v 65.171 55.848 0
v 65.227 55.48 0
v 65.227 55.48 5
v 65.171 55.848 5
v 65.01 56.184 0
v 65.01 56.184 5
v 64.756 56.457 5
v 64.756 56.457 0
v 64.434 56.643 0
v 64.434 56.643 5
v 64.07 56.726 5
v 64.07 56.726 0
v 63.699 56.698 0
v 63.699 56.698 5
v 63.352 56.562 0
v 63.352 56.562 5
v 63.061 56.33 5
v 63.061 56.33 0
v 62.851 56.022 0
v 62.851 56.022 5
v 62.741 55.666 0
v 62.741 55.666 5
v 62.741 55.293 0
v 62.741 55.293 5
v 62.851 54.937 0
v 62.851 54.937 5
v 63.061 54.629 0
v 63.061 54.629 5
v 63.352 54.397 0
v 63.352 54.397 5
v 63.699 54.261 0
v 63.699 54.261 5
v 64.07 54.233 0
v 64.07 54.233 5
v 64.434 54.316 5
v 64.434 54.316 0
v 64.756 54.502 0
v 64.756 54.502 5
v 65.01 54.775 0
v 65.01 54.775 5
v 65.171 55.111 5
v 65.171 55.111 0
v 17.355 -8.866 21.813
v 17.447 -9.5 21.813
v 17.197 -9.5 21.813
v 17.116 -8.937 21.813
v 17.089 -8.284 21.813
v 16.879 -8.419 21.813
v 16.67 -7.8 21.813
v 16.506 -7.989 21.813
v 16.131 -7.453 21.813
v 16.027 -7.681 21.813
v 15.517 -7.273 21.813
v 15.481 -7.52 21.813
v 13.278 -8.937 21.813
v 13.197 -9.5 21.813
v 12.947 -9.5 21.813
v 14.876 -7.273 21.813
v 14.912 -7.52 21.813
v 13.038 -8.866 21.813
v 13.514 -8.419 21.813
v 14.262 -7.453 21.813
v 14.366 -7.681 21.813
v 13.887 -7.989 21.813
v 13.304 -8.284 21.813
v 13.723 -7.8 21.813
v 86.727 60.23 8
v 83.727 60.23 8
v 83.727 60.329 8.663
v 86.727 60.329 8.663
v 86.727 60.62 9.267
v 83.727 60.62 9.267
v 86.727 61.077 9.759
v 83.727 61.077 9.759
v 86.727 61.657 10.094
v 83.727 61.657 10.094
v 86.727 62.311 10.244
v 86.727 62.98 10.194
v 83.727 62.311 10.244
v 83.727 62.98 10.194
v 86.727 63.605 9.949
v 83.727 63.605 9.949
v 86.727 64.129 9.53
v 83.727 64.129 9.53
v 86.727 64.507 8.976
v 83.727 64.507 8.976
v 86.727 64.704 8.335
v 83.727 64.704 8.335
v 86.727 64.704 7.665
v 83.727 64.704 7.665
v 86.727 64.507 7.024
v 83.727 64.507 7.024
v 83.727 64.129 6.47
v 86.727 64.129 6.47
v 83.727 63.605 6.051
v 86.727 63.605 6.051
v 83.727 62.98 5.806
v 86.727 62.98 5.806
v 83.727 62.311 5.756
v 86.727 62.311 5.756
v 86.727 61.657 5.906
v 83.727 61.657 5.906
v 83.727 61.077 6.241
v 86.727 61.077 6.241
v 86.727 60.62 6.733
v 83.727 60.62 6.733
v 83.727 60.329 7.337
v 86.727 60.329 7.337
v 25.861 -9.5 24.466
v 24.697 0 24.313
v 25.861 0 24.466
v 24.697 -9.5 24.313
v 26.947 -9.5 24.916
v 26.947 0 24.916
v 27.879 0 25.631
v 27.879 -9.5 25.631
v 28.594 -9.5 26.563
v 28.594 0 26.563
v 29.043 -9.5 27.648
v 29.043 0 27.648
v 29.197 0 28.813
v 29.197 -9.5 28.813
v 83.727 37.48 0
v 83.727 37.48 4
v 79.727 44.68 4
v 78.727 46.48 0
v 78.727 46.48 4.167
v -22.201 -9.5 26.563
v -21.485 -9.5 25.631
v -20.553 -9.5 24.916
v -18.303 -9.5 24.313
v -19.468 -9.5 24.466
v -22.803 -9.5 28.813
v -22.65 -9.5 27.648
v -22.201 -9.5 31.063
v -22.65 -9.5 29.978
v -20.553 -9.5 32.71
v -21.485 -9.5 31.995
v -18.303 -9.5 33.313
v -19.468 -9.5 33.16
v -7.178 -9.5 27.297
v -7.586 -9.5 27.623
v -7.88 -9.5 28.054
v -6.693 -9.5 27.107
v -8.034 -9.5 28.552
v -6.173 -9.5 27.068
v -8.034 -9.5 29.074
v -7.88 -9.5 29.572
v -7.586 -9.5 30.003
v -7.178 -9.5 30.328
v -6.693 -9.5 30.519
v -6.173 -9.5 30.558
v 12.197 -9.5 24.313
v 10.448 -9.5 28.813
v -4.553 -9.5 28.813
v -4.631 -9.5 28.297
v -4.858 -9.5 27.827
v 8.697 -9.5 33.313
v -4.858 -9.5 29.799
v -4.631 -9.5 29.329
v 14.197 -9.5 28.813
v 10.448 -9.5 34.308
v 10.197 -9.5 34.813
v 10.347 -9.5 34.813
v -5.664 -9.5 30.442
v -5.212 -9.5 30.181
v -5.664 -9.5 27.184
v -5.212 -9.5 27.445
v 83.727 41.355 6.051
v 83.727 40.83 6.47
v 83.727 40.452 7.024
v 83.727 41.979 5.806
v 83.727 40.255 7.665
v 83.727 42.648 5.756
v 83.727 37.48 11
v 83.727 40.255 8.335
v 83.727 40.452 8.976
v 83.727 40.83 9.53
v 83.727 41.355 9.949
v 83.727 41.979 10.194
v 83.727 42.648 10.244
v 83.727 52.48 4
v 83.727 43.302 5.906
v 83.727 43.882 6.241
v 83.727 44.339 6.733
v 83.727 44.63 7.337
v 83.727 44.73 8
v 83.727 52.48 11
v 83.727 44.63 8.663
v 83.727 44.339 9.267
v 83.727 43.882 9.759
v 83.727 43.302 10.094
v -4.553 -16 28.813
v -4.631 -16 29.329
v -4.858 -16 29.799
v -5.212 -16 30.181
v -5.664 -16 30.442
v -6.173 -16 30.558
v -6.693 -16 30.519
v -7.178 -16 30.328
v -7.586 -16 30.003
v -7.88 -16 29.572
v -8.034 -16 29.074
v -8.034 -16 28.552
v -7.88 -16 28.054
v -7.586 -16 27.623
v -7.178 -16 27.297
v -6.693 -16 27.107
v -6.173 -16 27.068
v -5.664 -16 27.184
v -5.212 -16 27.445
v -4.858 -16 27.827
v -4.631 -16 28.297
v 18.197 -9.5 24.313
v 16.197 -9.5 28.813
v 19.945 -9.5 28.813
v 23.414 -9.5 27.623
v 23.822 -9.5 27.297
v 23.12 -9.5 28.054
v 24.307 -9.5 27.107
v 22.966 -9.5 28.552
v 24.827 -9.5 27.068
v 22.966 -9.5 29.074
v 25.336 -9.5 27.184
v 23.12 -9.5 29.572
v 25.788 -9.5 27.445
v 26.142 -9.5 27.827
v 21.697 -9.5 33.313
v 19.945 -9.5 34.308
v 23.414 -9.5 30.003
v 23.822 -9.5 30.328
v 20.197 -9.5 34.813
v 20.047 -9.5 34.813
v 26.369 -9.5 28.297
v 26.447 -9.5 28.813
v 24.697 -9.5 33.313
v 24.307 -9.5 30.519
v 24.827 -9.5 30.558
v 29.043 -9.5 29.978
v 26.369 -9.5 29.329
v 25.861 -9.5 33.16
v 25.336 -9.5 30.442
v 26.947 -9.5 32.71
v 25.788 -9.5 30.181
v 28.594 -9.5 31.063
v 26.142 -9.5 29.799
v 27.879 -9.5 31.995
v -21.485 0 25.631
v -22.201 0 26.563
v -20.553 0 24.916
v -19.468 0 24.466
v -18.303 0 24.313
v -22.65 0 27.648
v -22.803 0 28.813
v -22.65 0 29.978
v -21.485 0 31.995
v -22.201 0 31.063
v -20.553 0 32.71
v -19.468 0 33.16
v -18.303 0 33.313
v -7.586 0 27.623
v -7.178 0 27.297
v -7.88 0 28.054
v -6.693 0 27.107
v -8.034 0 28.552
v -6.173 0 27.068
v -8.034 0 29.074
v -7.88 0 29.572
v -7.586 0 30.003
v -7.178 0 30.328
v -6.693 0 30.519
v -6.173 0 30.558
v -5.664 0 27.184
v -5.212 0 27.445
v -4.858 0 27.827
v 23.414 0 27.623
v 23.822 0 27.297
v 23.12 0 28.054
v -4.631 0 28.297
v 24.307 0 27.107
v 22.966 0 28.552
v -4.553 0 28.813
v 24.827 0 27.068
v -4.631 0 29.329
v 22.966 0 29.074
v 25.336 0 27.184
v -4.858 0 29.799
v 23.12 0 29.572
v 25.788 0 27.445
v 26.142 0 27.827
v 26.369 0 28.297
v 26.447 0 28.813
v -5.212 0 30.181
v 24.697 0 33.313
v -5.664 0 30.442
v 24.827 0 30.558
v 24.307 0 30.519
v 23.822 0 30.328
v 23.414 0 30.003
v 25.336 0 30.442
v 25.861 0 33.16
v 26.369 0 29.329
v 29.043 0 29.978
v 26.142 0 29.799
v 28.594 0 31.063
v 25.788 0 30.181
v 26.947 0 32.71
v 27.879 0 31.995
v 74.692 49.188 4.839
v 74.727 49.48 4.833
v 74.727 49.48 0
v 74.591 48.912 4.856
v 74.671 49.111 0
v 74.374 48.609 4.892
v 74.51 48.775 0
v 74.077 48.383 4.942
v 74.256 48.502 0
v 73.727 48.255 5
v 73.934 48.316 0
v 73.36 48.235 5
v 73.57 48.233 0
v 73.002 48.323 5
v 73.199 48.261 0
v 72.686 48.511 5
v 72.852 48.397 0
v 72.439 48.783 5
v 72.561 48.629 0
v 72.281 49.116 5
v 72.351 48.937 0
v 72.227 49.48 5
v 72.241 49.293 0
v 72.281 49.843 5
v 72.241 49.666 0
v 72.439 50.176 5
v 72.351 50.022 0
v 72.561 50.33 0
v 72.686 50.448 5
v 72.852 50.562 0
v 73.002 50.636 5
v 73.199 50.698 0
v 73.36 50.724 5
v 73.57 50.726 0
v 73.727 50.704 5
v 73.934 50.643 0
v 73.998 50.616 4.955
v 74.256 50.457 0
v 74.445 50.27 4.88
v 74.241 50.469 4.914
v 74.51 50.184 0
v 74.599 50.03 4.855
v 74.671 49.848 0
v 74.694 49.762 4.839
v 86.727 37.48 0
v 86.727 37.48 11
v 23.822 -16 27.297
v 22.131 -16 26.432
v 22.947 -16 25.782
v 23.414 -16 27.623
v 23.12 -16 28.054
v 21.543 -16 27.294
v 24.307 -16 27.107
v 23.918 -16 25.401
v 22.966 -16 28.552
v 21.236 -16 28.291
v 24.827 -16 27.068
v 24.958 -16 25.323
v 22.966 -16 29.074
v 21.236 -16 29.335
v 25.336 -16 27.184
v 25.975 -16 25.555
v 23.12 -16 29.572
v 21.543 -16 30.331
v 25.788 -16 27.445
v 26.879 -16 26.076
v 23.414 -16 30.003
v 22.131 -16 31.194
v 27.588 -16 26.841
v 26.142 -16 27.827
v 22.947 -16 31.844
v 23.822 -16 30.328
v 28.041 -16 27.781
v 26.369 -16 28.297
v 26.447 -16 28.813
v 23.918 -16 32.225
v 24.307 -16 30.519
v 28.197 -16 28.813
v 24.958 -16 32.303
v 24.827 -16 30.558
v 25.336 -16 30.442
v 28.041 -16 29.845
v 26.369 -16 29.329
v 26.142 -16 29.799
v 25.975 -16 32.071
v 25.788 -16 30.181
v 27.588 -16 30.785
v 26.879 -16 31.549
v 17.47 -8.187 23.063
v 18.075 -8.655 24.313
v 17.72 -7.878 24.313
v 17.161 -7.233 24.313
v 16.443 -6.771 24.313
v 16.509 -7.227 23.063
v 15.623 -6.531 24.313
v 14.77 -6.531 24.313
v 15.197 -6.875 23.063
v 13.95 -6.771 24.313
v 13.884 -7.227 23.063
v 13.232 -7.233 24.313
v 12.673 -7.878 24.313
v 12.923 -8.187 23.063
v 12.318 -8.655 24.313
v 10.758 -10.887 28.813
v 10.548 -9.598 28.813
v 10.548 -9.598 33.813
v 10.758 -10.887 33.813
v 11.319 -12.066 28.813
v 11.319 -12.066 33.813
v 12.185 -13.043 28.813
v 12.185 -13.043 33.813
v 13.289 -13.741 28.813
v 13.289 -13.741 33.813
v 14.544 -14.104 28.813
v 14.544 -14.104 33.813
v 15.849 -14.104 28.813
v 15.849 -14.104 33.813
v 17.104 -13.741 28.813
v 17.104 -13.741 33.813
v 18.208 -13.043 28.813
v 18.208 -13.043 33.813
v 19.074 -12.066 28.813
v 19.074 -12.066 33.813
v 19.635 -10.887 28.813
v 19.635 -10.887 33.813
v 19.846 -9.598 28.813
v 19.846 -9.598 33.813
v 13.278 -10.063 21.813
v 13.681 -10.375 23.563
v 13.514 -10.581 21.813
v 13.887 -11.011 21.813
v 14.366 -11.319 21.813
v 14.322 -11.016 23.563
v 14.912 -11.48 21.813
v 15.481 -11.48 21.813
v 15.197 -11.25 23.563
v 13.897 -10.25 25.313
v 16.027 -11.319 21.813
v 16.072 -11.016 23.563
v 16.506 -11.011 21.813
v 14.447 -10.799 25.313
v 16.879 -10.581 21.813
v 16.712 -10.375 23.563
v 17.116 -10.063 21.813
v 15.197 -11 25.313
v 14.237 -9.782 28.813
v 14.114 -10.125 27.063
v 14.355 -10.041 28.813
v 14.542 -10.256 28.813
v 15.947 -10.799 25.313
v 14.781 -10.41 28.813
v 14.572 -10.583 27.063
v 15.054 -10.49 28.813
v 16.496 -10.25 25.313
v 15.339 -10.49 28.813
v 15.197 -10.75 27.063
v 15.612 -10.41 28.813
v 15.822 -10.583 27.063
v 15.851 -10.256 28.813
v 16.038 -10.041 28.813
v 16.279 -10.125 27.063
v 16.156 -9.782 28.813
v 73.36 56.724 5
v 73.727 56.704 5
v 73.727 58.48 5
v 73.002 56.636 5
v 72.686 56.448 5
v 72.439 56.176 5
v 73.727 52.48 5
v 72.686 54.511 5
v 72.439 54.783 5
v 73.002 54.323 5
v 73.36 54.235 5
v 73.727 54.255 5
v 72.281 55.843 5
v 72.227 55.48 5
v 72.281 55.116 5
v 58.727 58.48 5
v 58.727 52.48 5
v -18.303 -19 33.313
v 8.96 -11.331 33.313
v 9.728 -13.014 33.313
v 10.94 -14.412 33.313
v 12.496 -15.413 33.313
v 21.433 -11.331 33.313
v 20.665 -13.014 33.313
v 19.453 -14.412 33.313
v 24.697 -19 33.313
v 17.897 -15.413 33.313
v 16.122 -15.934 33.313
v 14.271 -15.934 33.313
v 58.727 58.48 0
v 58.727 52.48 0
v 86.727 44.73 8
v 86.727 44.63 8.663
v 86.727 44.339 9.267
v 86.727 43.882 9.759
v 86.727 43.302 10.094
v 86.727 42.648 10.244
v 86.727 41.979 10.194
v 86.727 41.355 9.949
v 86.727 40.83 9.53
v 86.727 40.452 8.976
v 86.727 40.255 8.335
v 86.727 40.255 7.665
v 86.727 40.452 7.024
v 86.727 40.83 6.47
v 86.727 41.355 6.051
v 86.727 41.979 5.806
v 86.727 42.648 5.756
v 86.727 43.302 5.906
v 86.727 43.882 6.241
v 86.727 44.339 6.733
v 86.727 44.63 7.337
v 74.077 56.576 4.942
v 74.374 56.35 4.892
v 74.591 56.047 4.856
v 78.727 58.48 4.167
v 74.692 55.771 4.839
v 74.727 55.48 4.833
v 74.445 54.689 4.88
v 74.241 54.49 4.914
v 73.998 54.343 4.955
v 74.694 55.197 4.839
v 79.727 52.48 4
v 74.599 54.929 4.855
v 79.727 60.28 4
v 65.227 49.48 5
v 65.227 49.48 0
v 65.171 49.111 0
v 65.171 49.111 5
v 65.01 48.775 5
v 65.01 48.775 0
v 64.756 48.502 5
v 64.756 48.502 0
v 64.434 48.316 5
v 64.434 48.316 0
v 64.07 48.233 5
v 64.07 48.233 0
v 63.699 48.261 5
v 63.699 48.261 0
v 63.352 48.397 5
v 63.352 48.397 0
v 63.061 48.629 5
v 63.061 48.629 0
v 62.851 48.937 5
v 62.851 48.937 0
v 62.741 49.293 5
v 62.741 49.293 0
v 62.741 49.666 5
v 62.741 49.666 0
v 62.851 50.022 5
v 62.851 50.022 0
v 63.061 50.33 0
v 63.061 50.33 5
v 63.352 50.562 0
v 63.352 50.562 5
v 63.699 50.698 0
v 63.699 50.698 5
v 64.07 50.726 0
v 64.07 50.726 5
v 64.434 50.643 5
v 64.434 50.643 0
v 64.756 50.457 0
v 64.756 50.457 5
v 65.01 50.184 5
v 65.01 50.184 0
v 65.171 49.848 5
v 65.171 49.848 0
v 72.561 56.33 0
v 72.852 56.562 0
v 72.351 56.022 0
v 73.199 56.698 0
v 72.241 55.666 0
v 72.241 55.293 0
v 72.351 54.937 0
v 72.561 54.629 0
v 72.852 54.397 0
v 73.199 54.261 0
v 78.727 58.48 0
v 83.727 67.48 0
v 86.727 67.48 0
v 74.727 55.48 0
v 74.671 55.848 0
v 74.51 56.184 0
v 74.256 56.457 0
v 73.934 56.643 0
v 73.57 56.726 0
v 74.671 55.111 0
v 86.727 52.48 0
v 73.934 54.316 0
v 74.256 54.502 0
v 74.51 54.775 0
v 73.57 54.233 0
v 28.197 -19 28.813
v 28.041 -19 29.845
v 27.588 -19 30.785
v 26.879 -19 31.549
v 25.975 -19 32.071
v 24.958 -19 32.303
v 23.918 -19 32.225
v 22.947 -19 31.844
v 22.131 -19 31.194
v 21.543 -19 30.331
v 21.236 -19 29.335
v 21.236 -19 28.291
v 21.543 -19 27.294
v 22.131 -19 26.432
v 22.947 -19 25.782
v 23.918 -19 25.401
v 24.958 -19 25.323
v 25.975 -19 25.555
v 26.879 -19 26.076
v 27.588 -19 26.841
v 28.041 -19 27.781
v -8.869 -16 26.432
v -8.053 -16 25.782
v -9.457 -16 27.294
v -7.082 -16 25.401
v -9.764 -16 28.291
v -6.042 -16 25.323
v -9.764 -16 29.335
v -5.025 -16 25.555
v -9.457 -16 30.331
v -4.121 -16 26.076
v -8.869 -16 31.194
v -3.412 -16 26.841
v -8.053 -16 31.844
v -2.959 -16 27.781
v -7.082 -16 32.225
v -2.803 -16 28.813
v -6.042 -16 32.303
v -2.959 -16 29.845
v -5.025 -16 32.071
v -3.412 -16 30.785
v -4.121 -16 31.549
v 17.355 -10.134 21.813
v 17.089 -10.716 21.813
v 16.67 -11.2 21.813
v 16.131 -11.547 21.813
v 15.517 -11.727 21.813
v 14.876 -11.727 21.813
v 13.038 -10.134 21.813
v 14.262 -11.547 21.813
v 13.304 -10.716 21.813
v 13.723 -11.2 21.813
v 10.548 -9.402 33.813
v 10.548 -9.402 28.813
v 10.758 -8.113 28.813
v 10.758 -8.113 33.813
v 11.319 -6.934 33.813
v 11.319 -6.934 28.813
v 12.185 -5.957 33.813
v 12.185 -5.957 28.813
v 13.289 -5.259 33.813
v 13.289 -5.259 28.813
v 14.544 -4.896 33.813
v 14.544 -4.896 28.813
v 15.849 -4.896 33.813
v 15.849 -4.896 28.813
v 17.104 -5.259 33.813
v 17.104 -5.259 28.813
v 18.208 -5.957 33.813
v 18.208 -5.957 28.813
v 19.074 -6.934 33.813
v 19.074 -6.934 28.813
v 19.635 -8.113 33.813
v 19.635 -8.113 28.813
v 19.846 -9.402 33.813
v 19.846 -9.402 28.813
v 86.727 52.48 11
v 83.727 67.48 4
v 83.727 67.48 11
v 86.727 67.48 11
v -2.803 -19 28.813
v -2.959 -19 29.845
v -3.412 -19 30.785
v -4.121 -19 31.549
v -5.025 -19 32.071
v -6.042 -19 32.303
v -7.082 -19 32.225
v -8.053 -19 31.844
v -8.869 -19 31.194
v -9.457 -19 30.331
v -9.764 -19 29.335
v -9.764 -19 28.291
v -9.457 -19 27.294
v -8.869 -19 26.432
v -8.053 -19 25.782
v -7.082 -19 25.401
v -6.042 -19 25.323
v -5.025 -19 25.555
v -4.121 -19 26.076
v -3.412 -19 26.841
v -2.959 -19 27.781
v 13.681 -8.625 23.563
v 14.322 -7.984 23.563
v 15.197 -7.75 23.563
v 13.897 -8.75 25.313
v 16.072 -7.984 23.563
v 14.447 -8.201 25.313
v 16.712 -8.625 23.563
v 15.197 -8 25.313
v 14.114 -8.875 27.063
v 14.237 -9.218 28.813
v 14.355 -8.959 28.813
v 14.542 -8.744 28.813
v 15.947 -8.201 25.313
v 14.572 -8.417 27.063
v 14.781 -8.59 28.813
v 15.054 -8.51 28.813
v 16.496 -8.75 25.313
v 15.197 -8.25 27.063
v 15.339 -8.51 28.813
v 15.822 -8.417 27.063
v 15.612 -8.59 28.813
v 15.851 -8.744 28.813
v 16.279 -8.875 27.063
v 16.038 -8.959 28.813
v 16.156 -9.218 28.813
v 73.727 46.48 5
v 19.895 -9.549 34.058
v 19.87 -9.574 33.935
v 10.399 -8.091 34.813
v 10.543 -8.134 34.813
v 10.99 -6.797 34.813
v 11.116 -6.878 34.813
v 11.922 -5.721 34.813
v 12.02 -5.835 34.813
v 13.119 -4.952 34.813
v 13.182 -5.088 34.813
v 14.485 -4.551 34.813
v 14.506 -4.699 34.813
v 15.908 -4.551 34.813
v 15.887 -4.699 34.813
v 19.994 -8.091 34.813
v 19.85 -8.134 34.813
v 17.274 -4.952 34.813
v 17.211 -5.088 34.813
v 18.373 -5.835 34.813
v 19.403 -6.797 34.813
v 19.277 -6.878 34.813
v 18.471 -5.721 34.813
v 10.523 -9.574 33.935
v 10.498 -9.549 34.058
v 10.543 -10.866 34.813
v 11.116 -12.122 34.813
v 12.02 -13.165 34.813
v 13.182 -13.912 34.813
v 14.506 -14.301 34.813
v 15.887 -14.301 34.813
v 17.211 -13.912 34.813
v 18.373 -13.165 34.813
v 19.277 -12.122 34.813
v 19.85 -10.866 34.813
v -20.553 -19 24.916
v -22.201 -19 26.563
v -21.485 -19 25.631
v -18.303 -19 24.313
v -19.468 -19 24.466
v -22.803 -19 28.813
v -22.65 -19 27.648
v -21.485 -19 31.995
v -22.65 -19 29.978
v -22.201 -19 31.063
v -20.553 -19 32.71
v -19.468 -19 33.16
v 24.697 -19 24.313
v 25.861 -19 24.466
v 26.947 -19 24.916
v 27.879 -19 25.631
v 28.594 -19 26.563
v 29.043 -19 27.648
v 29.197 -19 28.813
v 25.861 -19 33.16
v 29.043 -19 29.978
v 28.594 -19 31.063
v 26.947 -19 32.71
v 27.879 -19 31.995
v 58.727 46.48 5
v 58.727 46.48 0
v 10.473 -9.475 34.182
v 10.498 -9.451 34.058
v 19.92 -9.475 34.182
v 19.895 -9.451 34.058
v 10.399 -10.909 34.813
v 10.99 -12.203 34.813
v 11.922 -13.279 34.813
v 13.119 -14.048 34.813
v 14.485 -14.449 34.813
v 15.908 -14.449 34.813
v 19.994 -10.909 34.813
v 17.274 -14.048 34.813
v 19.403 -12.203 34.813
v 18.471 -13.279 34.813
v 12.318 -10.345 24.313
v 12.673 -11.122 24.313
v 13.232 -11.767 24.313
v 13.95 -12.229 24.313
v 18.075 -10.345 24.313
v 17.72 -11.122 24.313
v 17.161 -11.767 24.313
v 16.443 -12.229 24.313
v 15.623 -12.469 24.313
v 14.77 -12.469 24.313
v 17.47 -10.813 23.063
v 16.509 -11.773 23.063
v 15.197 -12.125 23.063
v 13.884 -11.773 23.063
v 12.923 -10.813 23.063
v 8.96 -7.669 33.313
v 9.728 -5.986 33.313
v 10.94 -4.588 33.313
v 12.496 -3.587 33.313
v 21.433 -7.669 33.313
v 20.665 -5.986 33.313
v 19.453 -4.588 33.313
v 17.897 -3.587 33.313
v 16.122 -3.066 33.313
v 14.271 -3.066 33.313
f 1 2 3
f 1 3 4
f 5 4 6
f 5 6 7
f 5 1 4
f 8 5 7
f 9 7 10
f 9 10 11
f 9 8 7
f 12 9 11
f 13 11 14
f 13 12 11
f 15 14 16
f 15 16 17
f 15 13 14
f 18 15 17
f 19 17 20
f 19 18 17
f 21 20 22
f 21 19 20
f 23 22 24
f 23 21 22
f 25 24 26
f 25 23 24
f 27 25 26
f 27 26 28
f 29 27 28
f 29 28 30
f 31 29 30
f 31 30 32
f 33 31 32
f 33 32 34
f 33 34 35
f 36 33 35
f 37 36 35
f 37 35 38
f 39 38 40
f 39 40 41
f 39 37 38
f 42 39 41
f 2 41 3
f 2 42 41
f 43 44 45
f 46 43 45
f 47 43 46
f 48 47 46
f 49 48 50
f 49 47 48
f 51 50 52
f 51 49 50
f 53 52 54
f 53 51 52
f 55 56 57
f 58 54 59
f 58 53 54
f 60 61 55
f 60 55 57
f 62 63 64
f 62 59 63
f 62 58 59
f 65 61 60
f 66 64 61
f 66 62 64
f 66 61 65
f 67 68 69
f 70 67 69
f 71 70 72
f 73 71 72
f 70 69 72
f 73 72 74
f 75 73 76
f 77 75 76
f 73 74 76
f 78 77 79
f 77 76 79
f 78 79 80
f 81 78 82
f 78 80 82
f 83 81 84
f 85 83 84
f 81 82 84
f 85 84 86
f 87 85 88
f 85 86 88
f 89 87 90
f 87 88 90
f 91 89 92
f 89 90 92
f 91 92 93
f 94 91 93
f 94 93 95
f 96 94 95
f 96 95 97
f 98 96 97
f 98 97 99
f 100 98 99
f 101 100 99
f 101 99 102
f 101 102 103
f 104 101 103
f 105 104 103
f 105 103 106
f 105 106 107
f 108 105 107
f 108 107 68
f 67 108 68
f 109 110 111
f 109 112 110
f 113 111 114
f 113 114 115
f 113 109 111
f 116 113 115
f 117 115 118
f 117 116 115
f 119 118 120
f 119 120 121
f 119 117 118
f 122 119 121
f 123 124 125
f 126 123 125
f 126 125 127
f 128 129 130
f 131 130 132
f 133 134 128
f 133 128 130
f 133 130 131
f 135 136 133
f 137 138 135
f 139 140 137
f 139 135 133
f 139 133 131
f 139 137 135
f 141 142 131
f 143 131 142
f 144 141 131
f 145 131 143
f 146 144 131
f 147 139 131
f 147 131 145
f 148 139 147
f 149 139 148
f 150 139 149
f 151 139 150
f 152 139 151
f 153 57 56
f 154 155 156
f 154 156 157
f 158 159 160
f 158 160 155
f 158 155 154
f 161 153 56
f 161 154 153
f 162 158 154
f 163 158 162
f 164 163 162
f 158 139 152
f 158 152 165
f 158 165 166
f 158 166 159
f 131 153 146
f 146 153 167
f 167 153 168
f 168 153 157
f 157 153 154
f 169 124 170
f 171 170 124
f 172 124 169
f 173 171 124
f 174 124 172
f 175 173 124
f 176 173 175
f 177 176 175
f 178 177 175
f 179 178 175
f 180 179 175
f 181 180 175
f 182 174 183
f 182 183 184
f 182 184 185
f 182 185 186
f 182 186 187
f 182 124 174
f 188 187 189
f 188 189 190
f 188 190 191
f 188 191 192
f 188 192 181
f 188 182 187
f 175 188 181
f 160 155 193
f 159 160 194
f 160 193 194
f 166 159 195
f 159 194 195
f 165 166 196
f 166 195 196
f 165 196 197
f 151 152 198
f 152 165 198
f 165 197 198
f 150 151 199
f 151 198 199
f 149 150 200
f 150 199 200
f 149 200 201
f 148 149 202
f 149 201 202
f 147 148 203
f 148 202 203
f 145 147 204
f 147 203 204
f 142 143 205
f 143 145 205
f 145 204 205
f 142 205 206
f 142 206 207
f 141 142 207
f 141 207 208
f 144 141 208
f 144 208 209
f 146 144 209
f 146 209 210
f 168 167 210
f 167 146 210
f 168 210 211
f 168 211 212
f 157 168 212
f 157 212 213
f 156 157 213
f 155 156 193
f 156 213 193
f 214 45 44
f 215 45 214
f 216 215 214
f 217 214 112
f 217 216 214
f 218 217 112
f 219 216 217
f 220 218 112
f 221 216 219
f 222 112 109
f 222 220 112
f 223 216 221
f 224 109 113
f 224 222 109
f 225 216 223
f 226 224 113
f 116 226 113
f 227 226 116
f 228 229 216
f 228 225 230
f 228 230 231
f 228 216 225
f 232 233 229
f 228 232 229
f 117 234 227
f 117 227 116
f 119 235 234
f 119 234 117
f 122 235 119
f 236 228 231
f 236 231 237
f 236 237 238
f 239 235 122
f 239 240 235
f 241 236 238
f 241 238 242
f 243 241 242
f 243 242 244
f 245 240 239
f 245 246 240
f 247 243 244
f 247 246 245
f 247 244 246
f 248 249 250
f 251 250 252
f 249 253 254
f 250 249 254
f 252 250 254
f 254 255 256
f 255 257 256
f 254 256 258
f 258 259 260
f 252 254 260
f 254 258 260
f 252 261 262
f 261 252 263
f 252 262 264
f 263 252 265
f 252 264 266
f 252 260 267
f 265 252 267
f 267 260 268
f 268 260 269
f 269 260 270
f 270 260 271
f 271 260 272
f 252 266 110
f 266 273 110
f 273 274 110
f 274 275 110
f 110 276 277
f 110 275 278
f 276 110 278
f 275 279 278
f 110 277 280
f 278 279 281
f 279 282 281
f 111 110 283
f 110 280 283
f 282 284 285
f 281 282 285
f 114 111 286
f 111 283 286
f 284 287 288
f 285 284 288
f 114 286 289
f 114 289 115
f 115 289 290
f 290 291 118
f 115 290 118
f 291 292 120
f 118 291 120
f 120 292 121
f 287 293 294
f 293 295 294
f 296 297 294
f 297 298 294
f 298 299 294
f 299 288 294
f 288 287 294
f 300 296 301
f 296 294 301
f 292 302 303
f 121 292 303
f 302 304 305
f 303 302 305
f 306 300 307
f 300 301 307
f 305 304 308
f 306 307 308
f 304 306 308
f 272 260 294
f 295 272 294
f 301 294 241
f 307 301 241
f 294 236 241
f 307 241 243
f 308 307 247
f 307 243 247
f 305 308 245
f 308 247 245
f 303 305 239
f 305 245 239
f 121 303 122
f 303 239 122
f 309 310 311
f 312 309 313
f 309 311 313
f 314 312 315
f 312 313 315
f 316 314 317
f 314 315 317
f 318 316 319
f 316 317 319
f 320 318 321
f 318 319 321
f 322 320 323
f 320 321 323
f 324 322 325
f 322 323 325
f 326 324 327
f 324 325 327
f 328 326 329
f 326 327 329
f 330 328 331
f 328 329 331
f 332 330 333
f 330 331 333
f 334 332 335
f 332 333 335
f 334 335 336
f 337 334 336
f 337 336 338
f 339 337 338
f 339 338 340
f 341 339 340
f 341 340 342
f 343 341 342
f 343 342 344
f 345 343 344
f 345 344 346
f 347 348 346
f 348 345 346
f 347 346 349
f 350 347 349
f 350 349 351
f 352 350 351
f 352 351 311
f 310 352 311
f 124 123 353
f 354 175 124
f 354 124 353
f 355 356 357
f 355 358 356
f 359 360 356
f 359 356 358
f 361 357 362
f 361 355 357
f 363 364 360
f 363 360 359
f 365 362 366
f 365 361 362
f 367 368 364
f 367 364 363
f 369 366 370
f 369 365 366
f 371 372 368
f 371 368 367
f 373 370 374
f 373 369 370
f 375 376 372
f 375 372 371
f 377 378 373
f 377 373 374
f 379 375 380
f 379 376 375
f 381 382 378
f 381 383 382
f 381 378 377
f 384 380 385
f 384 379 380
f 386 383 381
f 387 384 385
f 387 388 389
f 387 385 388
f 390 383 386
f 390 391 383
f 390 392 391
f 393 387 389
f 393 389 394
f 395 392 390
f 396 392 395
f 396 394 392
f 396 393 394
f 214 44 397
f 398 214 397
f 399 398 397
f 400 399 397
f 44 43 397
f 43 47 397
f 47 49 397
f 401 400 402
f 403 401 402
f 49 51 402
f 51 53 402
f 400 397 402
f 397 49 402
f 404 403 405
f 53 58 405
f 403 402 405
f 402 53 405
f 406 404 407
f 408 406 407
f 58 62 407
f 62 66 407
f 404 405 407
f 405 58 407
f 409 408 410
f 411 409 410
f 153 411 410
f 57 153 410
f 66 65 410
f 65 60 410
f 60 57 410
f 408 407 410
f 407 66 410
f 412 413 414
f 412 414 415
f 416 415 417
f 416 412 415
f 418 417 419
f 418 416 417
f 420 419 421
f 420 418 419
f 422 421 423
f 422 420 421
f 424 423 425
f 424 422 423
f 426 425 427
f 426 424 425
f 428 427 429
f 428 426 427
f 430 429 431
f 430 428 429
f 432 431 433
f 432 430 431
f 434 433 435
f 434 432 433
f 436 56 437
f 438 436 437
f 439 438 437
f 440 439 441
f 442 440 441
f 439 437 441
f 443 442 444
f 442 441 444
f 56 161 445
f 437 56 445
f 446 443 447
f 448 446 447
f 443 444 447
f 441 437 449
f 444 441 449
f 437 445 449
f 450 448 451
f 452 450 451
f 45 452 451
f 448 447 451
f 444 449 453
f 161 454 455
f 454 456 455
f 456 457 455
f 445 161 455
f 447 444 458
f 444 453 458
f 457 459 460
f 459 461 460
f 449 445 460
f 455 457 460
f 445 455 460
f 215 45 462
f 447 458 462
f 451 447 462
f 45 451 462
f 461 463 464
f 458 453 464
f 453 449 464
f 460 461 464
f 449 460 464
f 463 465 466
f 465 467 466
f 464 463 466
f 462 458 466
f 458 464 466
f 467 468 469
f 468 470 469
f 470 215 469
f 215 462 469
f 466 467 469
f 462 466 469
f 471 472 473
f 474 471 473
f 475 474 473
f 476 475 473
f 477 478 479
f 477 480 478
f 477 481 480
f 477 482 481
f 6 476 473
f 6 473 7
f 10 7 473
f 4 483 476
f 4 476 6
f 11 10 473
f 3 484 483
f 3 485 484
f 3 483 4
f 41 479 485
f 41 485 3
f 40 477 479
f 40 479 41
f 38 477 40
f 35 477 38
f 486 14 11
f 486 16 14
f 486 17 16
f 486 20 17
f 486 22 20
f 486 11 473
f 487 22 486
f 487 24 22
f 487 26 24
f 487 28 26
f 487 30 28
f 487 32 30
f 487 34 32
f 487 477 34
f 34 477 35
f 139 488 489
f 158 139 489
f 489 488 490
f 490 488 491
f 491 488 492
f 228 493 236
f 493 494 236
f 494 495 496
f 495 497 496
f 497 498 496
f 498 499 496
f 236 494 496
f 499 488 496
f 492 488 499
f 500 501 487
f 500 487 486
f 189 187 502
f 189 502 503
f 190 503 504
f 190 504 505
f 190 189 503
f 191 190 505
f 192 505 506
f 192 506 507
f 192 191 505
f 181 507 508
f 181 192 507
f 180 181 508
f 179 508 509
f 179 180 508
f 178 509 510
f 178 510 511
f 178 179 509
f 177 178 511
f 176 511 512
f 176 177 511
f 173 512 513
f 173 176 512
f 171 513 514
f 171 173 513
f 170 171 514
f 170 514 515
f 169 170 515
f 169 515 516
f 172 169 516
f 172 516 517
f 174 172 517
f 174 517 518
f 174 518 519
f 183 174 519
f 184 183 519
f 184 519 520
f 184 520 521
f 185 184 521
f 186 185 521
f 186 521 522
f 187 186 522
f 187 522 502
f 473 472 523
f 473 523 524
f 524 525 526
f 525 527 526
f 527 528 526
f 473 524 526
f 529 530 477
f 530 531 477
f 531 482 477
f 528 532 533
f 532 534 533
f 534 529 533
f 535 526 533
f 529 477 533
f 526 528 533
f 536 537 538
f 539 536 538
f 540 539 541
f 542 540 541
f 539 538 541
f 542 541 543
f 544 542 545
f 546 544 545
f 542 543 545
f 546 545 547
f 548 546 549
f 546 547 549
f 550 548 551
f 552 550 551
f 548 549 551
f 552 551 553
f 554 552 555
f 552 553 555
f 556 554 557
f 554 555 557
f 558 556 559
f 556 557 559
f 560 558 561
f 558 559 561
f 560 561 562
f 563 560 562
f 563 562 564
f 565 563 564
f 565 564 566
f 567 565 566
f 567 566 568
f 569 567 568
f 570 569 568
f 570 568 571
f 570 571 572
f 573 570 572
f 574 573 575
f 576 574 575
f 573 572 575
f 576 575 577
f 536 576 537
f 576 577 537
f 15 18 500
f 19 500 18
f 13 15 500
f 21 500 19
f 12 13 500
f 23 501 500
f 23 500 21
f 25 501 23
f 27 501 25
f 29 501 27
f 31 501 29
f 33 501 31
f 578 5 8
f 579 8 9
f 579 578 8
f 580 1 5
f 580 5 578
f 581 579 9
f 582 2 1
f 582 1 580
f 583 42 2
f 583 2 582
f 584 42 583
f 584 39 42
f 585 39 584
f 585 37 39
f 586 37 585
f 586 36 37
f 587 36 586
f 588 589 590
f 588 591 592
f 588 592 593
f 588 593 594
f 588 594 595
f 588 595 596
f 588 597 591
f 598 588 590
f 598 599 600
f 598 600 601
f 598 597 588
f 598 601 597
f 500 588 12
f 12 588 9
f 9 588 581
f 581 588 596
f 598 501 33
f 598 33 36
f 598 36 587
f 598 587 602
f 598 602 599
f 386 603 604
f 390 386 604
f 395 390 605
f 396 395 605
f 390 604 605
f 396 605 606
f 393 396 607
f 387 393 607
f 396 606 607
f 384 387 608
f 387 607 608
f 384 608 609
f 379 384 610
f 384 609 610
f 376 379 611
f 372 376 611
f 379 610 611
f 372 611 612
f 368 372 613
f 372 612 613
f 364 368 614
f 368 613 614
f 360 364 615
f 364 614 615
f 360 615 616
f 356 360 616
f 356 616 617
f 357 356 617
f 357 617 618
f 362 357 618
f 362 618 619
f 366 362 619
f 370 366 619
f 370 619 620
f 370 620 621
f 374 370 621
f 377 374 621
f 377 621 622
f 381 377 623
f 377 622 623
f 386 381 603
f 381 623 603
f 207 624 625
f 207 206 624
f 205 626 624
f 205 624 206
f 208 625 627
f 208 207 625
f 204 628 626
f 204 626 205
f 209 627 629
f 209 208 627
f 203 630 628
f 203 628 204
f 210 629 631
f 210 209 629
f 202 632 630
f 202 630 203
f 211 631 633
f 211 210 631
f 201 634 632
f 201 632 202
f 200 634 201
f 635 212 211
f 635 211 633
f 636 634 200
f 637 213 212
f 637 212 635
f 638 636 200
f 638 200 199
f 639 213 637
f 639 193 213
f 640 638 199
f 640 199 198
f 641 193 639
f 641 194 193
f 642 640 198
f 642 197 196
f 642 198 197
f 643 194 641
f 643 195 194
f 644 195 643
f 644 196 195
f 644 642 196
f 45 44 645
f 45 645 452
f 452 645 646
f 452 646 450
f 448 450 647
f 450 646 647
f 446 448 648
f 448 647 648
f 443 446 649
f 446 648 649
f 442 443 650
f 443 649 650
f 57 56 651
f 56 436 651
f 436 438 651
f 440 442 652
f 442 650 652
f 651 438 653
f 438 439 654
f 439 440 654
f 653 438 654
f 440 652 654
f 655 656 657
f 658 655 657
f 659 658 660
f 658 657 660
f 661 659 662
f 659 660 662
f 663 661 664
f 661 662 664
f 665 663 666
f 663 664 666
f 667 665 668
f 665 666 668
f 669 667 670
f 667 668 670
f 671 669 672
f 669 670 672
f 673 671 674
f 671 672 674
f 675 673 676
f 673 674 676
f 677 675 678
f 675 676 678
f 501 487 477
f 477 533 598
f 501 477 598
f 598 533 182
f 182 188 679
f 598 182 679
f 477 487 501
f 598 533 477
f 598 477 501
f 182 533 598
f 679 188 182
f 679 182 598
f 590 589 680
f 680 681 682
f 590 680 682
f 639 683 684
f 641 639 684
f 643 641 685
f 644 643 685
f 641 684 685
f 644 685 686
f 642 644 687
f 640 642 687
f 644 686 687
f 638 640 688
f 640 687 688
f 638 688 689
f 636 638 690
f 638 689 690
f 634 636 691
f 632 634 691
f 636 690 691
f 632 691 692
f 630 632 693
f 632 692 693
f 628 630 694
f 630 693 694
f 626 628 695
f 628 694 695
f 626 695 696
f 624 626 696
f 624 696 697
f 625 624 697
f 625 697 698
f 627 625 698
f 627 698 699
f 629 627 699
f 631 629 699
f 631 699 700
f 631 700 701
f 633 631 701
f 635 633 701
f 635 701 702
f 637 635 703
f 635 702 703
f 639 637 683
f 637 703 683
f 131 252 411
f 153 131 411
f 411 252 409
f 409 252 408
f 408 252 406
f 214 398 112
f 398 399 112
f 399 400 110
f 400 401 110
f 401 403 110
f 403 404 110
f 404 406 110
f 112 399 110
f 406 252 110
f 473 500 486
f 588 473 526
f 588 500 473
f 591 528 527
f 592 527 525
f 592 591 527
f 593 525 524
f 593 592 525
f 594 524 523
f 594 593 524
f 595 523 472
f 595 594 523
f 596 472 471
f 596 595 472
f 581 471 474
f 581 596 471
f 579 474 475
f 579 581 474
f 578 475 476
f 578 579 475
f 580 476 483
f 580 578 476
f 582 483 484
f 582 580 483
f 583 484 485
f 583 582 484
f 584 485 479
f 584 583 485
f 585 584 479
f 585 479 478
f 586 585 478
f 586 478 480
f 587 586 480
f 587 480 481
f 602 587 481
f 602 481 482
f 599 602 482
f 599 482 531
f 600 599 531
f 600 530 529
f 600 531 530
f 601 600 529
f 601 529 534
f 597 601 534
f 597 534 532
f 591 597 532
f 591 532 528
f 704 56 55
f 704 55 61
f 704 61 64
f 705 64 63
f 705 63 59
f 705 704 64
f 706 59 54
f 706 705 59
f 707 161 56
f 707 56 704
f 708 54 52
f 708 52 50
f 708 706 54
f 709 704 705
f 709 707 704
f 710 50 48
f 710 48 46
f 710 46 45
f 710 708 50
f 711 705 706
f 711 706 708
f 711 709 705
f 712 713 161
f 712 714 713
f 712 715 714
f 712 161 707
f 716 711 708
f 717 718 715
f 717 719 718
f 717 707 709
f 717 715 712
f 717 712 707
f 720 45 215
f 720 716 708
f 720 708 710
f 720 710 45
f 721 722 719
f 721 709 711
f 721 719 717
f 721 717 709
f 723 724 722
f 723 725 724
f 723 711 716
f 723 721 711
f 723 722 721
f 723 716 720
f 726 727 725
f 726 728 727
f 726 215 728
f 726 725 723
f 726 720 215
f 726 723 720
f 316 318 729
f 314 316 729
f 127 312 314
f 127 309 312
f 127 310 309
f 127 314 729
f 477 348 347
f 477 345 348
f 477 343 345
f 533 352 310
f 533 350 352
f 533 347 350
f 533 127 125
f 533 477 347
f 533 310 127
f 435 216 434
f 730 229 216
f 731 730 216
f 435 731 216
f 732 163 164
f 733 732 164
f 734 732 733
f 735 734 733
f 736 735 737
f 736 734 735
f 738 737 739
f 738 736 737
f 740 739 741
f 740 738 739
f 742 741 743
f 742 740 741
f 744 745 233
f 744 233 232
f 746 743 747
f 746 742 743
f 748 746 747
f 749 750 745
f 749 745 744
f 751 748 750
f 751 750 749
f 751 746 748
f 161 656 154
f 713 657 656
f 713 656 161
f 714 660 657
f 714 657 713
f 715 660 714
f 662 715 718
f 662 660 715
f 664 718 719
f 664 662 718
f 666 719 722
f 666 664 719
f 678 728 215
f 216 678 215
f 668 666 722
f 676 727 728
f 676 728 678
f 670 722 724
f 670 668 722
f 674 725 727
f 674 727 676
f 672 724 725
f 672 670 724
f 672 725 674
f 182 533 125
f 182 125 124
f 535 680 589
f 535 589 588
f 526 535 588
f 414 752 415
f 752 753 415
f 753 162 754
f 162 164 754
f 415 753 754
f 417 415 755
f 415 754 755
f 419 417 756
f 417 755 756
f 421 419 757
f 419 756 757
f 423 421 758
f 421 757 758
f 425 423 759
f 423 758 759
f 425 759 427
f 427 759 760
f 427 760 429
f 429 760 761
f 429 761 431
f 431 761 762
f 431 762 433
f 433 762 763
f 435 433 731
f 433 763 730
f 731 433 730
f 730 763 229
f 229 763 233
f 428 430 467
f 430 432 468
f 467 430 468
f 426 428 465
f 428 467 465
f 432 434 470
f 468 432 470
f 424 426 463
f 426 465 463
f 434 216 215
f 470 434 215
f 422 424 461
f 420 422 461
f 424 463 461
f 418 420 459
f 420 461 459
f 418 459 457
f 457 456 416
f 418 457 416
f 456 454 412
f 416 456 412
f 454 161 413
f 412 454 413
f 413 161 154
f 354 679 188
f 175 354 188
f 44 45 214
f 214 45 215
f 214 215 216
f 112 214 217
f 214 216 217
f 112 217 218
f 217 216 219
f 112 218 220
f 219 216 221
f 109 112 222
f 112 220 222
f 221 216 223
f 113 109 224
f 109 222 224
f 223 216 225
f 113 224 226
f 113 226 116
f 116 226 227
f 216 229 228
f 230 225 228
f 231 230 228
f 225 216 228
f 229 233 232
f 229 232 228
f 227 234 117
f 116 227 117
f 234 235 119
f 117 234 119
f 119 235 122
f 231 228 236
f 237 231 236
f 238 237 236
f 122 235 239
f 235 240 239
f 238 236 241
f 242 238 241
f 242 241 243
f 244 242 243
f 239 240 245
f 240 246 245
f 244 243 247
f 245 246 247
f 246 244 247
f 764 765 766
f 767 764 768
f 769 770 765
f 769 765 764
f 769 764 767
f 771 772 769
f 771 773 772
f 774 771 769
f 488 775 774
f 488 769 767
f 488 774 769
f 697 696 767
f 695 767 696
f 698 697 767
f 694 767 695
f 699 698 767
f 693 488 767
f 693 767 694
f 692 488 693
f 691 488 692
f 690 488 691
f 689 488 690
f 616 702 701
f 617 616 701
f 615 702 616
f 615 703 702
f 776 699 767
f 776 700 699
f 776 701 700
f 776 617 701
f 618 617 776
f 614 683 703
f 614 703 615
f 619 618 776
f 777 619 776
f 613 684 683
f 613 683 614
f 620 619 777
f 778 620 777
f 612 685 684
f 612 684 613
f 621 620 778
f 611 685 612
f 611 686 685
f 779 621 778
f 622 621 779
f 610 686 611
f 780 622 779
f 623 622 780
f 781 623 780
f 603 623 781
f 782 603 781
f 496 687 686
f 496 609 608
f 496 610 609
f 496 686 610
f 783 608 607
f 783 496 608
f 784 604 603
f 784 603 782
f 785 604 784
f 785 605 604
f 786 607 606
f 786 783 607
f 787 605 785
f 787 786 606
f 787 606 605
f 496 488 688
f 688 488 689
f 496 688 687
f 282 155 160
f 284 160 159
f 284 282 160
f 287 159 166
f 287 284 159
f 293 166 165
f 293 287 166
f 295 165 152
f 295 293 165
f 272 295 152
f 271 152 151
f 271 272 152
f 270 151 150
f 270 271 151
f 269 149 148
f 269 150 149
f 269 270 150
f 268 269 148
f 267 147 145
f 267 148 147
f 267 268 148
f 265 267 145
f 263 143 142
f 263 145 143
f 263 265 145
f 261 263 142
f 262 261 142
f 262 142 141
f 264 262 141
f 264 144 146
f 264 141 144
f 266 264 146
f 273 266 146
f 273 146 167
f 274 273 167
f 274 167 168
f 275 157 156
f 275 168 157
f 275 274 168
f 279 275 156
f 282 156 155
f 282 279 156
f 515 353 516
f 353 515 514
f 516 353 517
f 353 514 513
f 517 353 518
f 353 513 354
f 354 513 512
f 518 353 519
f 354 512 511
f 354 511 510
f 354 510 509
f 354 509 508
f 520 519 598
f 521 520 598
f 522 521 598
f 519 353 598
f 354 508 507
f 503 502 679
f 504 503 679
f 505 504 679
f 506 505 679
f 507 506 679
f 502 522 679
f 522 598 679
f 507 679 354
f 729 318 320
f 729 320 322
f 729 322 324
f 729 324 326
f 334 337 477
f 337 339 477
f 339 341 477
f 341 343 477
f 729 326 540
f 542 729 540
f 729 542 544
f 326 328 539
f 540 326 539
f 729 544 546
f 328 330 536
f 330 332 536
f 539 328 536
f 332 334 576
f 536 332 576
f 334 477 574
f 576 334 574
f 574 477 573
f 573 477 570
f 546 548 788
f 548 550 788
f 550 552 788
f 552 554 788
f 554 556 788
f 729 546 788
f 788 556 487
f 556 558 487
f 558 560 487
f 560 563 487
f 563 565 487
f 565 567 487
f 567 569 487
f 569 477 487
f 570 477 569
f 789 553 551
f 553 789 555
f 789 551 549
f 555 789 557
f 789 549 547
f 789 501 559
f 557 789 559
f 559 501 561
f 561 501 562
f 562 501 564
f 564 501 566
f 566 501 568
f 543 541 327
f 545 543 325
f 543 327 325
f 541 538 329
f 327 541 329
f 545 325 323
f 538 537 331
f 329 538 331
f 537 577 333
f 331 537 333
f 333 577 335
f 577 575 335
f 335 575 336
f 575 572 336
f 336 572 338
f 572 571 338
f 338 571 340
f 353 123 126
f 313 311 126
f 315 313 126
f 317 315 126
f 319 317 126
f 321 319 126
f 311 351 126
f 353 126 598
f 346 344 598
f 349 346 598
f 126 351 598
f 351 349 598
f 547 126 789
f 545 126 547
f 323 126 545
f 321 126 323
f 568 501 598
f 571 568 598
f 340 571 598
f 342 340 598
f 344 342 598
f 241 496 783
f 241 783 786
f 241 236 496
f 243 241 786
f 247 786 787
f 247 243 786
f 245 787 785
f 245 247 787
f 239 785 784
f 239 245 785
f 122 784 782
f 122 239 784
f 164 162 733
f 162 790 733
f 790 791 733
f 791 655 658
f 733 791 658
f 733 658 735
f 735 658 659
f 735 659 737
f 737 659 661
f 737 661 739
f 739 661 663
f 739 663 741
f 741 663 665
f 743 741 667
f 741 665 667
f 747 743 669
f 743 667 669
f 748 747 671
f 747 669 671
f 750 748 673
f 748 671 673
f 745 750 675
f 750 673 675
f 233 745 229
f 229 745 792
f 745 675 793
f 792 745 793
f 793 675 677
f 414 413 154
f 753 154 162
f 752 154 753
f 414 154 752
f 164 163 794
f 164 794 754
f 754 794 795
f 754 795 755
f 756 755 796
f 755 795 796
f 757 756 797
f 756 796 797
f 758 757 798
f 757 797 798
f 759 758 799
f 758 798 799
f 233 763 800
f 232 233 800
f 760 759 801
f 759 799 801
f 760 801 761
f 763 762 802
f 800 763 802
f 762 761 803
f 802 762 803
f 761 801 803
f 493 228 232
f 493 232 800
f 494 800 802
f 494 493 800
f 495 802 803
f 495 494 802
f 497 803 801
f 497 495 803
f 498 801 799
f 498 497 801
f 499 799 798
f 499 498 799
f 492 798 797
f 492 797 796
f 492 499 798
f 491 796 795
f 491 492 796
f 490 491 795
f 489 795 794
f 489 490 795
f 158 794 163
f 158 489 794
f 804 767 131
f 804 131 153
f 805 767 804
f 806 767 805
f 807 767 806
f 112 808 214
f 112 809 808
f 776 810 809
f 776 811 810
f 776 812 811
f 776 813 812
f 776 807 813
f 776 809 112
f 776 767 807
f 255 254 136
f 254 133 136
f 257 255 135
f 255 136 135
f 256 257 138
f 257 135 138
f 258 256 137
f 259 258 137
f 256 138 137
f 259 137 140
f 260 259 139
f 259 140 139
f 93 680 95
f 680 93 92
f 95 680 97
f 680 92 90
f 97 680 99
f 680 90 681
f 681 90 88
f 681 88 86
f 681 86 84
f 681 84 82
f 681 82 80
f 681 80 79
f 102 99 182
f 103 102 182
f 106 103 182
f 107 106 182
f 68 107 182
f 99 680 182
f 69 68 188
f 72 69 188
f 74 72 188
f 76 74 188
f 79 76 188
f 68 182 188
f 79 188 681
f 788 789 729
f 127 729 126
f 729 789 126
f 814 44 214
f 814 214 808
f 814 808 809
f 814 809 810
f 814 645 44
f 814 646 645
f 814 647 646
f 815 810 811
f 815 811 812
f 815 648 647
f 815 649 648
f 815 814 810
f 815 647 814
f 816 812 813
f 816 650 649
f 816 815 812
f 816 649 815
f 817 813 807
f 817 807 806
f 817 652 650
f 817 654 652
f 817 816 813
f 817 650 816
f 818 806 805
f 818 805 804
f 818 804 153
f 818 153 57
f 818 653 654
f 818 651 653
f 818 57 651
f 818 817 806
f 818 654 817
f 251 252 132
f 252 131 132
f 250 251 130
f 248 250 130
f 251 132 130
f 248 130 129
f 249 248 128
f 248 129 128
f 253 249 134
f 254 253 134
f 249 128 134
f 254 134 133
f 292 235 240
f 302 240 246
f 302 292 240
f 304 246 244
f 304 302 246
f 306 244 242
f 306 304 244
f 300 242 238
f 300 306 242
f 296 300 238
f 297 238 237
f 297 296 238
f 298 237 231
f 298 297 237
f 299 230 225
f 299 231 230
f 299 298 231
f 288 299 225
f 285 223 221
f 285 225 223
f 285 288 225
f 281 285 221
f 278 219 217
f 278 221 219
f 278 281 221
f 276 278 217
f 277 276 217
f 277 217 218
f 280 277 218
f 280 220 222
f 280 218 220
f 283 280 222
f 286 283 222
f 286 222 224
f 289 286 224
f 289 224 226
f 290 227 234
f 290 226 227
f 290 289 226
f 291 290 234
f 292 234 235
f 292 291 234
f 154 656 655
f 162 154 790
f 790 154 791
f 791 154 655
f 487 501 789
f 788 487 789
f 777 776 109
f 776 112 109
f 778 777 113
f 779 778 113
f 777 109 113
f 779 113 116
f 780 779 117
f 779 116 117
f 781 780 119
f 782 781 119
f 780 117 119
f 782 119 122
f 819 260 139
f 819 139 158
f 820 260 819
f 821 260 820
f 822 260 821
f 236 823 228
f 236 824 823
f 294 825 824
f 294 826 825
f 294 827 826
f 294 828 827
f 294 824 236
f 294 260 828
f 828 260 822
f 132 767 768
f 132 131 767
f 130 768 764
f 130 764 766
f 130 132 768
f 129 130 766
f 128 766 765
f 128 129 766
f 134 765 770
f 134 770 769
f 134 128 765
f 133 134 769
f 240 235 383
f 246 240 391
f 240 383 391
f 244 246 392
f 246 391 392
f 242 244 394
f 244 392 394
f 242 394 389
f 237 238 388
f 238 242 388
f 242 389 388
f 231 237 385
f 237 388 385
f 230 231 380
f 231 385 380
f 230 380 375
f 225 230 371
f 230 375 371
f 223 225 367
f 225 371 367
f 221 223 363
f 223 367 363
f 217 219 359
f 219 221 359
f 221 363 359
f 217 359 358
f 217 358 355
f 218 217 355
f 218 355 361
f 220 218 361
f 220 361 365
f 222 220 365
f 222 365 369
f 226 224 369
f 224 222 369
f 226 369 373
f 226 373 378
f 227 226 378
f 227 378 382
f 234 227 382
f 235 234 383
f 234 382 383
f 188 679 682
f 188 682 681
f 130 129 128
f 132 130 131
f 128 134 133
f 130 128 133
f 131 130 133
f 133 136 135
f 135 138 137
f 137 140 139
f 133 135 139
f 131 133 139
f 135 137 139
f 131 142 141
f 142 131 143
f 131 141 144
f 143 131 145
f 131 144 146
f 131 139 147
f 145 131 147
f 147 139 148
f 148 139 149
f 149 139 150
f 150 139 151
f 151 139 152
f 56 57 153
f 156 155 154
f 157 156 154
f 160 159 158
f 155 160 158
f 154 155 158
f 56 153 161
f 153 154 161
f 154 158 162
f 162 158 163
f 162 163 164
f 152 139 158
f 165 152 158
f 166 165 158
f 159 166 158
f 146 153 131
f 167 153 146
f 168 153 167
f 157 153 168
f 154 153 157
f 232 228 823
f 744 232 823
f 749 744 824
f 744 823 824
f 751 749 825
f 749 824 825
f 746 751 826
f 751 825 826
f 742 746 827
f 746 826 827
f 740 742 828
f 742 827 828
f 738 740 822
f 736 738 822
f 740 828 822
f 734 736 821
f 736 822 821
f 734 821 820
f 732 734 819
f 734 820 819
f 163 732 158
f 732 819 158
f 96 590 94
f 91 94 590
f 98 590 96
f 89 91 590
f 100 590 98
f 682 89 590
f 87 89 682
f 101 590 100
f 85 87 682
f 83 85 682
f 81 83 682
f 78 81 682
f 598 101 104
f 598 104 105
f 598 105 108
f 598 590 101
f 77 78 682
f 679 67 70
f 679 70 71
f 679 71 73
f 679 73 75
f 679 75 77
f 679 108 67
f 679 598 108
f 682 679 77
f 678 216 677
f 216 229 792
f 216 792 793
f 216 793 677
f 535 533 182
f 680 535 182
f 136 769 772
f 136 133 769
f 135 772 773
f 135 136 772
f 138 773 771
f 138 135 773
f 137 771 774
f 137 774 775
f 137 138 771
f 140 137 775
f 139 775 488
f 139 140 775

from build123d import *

# Parameters (mm, degrees)
F0_W           = 52
F0_H           = 9
F1_DEPTH       = 9.5
F3_DEPTH       = 4.5
F4_DEPTH       = 1.5
F5_SIZE        = 1.49999
F6_W           = 3
F6_H           = 2.5
F7_ANGLE       = 180
F10_SIZE2      = 0.74999
F10_SIZE       = 2.49999
F11_R          = 1.75
F12_DEPTH      = 42.06082
F13_R          = 4.49999
F15_R          = 3.5
F15_R_2        = 1.75
F16_DEPTH      = 3
F17_W          = 20
F17_H          = 6
F17_R          = 1.25
F18_DEPTH      = 5
F20_DEPTH      = 15
F21_T4_DEPTH   = 51.5816860873
F22_R          = 2.25
F23_DEPTH      = 25
F25_DEPTH      = 25
F27_T1_DEPTH   = 6.2546093825
F27_2_T1_DEPTH = 6.2546093825
F28_SIZE2      = 0.2
F28_SIZE       = 1
F29_SIZE2      = 1
F29_SIZE       = 0.2


# Not quite as in the source:
# - a fillet or chamfer that OpenCascade refuses, or shapes differently, is made with other operations: its cross-section is extruded or revolved along the edge and cut away or added
# - a fillet or chamfer is up to 0.001 mm smaller than in the source, because OpenCascade refuses the exact size


with BuildPart() as f1:
    # F0 (on Front) → F1 (new body)
    with BuildSketch(Plane.XZ):
        with Locations((3.196533835, 28.8128983229)):
            Rectangle(F0_W, F0_H)
    extrude(amount=F1_DEPTH)

    # F2 (on face) → F3 (cut)
    with BuildSketch(Plane.XY.offset(33.3128983229)):
        with BuildLine():
            Line((10.546533835, -9.5), (19.846533835, -9.5))
            ThreePointArc((19.846533835, -9.5), (15.196533835, -4.85), (10.546533835, -9.5))
        make_face()
    extrude(amount=-F3_DEPTH, mode=Mode.SUBTRACT)

    # F2 (on face) → F4 (join)
    with BuildSketch(Plane.XY.offset(33.3128983229)):
        with BuildLine():
            ThreePointArc((10.546533835, -9.5), (15.196533835, -4.85), (19.846533835, -9.5))
            Line((19.846533835, -9.5), (21.696533835, -9.5))
            ThreePointArc((21.696533835, -9.5), (15.196533835, -3), (8.696533835, -9.5))
            Line((8.696533835, -9.5), (10.546533835, -9.5))
        make_face()
    extrude(amount=F4_DEPTH)

    # F5 (size 1.5 in the source; OpenCascade refuses exactly that, so slightly less here)
    f5_edges = [f1.edges().sort_by_distance(p)[0] for p in [
        (15.196534, -3, 34.812898),
    ]]
    chamfer(f5_edges, length=F5_SIZE)

    # F6 (on face) → F7 (revolve)
    with BuildSketch(Plane.XZ.offset(9.5)):
        with Locations((16.696533835, 23.0628983229)):
            Rectangle(F6_W, F6_H)
        Polygon((16.196533835, 28.8128983229), (15.196533835, 28.8128983229), (15.196533835, 24.3128983229), (18.196533835, 24.3128983229), align=None)
    revolve(axis=Axis((15.196533835, -9.5, 25.3128983229), (0, 0, 1)), revolution_arc=F7_ANGLE)

    # F8 (on face) → F9 (revolve, cut)
    with BuildSketch(Plane.XZ.offset(9.5)):
        Polygon((16.196533835, 28.8128983229), (15.196533835, 28.8128983229), (15.196533835, 21.8128983229), (17.196533835, 21.8128983229), align=None)
    revolve(axis=Axis((15.196533835, -9.5, 25.3128983229), (0, 0, -1)), mode=Mode.SUBTRACT)

    # F10 (size 2.5 and 0.75 in the source; OpenCascade refuses exactly that, so slightly less here)
    f10_edges = [f1.edges().sort_by_distance(p)[0] for p in [
        (15.196534, -6.5, 21.812898),
    ]]
    f10_side = f1.faces().sort_by_distance((15.196534, -6.5, 23.062898))[0]
    chamfer(f10_edges, length=F10_SIZE, length2=F10_SIZE2, reference=f10_side)

    # F11 (on Front) → F12 (cut)
    with BuildSketch(Plane.XZ):
        with Locations((24.696533835, 28.8128983229)):
            Circle(F11_R)
        with Locations((-6.303466165, 28.8128983229)):
            Circle(F11_R)
    extrude(amount=F12_DEPTH, mode=Mode.SUBTRACT)

    # F13 (radius 4.5 in the source; OpenCascade refuses exactly that, so slightly less here)
    f13_edges = [f1.edges().sort_by_distance(p)[0] for p in [
        (29.196534, -4.75, 33.312898),
        (29.196534, -4.75, 24.312898),
        (-22.803466, -4.75, 33.312898),
        (-22.803466, -4.75, 24.312898),
    ]]
    fillet(f13_edges, radius=F13_R)


with BuildPart() as f14_1:
    # F14: instance of F1
    add(f1.part.mirror(Plane(origin=(-4.5395011787, -9.5, 28.6957157719), x_dir=(1, 0, 0), z_dir=(0, -1, 0))))

    # F15 (on face) → F16 (cut)
    with BuildSketch(Plane.XZ.offset(19)):
        with Locations((-6.303466165, 28.8128983229)):
            Circle(F15_R)
        with Locations((-6.303466165, 28.8128983229)):
            Circle(F15_R_2, mode=Mode.SUBTRACT)
        with Locations((24.696533835, 28.8128983229)):
            Circle(F15_R)
        with Locations((24.696533835, 28.8128983229)):
            Circle(F15_R_2, mode=Mode.SUBTRACT)
    extrude(amount=-F16_DEPTH, mode=Mode.SUBTRACT)

    # F27: chamfer of 0.1 on 2 edges, made by hand

    # F27_s2 → F27_t1 (cut)
    with BuildSketch(Plane.XY.offset(28.8128983229)):
        with BuildLine():
            Line((10.5475644201, -9.5978947368), (10.4475865832, -9.5))
            Line((10.4475865832, -9.5), (10.546533835, -9.5))
            ThreePointArc((10.546533835, -9.5), (10.5468065962, -9.5503647222), (10.5475644201, -9.5978947368))
        make_face()
        with BuildLine():
            Line((19.9454810868, -9.5), (19.8455032499, -9.5978947368))
            ThreePointArc((19.8455032499, -9.5978947368), (19.8462610737, -9.5503647222), (19.846533835, -9.5))
            Line((19.846533835, -9.5), (19.9454810868, -9.5))
        make_face()
    extrude(amount=F27_T1_DEPTH, mode=Mode.SUBTRACT)

    # F28
    f28_edges = [f14_1.edges().sort_by_distance(p)[0] for p in [
        (15.196534, -14.15, 34.812898),
    ]]
    f28_side = f14_1.faces().sort_by_distance((15.196534, -14.15, 31.812898))[0]
    chamfer(f28_edges, length=F28_SIZE, length2=F28_SIZE2, reference=f28_side)


with BuildPart() as f18:
    # F17 (on Top) → F18 (new body)
    with BuildSketch(Plane.XY):
        with Locations((68.7268972397, 55.4795021277)):
            Rectangle(F17_W, F17_H)
        with Locations((63.9768972397, 55.4795021277)):
            Circle(F17_R, mode=Mode.SUBTRACT)
        with Locations((73.4768972397, 55.4795021277)):
            Circle(F17_R, mode=Mode.SUBTRACT)
    extrude(amount=F18_DEPTH)

    # F19 (on face) → F20 (join)
    with BuildSketch(Plane.XZ.offset(-52.4795021277)):
        Polygon((83.7268972397, 5), (78.7268972397, 5), (78.7268972397, 0), (86.7268972397, 0), (86.7268972397, 11), (83.7268972397, 11), align=None)
    extrude(amount=-F20_DEPTH)

    # F21: chamfer of 9 x 5 on 1 edges, made by hand


with BuildPart() as f21_tool2:
    # F21_s3 → F21_t4 (new body)
    with BuildSketch(Plane.XY.offset(28.2908430436)):
        Polygon((83.7268972397, 67.4795021277), (78.7268972397, 58.4795021277), (78.7268972397, 67.4795021277), align=None)
    extrude(amount=-F21_T4_DEPTH)

    split(bisect_by=Plane.XZ.offset(-58.4795021277), keep=Keep.BOTTOM)


with BuildPart() as f18_1:
    add(f18.part)

    # F21_t1: cut F21_tool2
    add(f21_tool2.part, mode=Mode.SUBTRACT)

    # F22 (on face) → F23 (cut)
    with BuildSketch(Plane(origin=(83.7268972397, 0, 0), x_dir=(0, -1, 0), z_dir=(-1, 0, 0))):
        with Locations((-62.4795021277, 8)):
            Circle(F22_R)
    extrude(amount=-F23_DEPTH, mode=Mode.SUBTRACT)

    # F24 (on face) → F25 (cut)
    with BuildSketch(Plane.XZ.offset(-52.4795021277)):
        Polygon((83.7268972397, 4), (83.7268972397, 5), (73.7268972397, 5), (79.7268972397, 4), align=None)
    extrude(amount=-F25_DEPTH, mode=Mode.SUBTRACT)


with BuildPart() as f26_1:
    # F26: instance of F18
    add(f18_1.part.mirror(Plane(origin=(73.8792151205, 52.4795021277, 3.059602649), x_dir=(1, 0, 0), z_dir=(0, -1, 0))))


with BuildPart() as f1_1:
    add(f1.part)

    # F27#2: chamfer of 0.1 on 2 edges, made by hand

    # F27_2_s2 → F27_2_t1 (cut)
    with BuildSketch(Plane.XY.offset(28.8128983229)):
        with BuildLine():
            Line((10.5475644201, -9.4021052632), (10.4475865832, -9.5))
            Line((10.4475865832, -9.5), (10.546533835, -9.5))
            ThreePointArc((10.546533835, -9.5), (10.5468065962, -9.4496352778), (10.5475644201, -9.4021052632))
        make_face()
        with BuildLine():
            Line((19.9454810868, -9.5), (19.8455032499, -9.4021052632))
            ThreePointArc((19.8455032499, -9.4021052632), (19.8462610737, -9.4496352778), (19.846533835, -9.5))
            Line((19.846533835, -9.5), (19.9454810868, -9.5))
        make_face()
    extrude(amount=F27_2_T1_DEPTH, mode=Mode.SUBTRACT)

    # F29
    f29_edges = [f1_1.edges().sort_by_distance(p)[0] for p in [
        (15.196534, -4.85, 34.812898),
    ]]
    f29_side = f1_1.faces().sort_by_distance((15.196534, -4.611794, 34.812898))[0]
    chamfer(f29_edges, length=F29_SIZE, length2=F29_SIZE2, reference=f29_side)


solid = Compound([f14_1.part, f18_1.part, f26_1.part, f1_1.part])
